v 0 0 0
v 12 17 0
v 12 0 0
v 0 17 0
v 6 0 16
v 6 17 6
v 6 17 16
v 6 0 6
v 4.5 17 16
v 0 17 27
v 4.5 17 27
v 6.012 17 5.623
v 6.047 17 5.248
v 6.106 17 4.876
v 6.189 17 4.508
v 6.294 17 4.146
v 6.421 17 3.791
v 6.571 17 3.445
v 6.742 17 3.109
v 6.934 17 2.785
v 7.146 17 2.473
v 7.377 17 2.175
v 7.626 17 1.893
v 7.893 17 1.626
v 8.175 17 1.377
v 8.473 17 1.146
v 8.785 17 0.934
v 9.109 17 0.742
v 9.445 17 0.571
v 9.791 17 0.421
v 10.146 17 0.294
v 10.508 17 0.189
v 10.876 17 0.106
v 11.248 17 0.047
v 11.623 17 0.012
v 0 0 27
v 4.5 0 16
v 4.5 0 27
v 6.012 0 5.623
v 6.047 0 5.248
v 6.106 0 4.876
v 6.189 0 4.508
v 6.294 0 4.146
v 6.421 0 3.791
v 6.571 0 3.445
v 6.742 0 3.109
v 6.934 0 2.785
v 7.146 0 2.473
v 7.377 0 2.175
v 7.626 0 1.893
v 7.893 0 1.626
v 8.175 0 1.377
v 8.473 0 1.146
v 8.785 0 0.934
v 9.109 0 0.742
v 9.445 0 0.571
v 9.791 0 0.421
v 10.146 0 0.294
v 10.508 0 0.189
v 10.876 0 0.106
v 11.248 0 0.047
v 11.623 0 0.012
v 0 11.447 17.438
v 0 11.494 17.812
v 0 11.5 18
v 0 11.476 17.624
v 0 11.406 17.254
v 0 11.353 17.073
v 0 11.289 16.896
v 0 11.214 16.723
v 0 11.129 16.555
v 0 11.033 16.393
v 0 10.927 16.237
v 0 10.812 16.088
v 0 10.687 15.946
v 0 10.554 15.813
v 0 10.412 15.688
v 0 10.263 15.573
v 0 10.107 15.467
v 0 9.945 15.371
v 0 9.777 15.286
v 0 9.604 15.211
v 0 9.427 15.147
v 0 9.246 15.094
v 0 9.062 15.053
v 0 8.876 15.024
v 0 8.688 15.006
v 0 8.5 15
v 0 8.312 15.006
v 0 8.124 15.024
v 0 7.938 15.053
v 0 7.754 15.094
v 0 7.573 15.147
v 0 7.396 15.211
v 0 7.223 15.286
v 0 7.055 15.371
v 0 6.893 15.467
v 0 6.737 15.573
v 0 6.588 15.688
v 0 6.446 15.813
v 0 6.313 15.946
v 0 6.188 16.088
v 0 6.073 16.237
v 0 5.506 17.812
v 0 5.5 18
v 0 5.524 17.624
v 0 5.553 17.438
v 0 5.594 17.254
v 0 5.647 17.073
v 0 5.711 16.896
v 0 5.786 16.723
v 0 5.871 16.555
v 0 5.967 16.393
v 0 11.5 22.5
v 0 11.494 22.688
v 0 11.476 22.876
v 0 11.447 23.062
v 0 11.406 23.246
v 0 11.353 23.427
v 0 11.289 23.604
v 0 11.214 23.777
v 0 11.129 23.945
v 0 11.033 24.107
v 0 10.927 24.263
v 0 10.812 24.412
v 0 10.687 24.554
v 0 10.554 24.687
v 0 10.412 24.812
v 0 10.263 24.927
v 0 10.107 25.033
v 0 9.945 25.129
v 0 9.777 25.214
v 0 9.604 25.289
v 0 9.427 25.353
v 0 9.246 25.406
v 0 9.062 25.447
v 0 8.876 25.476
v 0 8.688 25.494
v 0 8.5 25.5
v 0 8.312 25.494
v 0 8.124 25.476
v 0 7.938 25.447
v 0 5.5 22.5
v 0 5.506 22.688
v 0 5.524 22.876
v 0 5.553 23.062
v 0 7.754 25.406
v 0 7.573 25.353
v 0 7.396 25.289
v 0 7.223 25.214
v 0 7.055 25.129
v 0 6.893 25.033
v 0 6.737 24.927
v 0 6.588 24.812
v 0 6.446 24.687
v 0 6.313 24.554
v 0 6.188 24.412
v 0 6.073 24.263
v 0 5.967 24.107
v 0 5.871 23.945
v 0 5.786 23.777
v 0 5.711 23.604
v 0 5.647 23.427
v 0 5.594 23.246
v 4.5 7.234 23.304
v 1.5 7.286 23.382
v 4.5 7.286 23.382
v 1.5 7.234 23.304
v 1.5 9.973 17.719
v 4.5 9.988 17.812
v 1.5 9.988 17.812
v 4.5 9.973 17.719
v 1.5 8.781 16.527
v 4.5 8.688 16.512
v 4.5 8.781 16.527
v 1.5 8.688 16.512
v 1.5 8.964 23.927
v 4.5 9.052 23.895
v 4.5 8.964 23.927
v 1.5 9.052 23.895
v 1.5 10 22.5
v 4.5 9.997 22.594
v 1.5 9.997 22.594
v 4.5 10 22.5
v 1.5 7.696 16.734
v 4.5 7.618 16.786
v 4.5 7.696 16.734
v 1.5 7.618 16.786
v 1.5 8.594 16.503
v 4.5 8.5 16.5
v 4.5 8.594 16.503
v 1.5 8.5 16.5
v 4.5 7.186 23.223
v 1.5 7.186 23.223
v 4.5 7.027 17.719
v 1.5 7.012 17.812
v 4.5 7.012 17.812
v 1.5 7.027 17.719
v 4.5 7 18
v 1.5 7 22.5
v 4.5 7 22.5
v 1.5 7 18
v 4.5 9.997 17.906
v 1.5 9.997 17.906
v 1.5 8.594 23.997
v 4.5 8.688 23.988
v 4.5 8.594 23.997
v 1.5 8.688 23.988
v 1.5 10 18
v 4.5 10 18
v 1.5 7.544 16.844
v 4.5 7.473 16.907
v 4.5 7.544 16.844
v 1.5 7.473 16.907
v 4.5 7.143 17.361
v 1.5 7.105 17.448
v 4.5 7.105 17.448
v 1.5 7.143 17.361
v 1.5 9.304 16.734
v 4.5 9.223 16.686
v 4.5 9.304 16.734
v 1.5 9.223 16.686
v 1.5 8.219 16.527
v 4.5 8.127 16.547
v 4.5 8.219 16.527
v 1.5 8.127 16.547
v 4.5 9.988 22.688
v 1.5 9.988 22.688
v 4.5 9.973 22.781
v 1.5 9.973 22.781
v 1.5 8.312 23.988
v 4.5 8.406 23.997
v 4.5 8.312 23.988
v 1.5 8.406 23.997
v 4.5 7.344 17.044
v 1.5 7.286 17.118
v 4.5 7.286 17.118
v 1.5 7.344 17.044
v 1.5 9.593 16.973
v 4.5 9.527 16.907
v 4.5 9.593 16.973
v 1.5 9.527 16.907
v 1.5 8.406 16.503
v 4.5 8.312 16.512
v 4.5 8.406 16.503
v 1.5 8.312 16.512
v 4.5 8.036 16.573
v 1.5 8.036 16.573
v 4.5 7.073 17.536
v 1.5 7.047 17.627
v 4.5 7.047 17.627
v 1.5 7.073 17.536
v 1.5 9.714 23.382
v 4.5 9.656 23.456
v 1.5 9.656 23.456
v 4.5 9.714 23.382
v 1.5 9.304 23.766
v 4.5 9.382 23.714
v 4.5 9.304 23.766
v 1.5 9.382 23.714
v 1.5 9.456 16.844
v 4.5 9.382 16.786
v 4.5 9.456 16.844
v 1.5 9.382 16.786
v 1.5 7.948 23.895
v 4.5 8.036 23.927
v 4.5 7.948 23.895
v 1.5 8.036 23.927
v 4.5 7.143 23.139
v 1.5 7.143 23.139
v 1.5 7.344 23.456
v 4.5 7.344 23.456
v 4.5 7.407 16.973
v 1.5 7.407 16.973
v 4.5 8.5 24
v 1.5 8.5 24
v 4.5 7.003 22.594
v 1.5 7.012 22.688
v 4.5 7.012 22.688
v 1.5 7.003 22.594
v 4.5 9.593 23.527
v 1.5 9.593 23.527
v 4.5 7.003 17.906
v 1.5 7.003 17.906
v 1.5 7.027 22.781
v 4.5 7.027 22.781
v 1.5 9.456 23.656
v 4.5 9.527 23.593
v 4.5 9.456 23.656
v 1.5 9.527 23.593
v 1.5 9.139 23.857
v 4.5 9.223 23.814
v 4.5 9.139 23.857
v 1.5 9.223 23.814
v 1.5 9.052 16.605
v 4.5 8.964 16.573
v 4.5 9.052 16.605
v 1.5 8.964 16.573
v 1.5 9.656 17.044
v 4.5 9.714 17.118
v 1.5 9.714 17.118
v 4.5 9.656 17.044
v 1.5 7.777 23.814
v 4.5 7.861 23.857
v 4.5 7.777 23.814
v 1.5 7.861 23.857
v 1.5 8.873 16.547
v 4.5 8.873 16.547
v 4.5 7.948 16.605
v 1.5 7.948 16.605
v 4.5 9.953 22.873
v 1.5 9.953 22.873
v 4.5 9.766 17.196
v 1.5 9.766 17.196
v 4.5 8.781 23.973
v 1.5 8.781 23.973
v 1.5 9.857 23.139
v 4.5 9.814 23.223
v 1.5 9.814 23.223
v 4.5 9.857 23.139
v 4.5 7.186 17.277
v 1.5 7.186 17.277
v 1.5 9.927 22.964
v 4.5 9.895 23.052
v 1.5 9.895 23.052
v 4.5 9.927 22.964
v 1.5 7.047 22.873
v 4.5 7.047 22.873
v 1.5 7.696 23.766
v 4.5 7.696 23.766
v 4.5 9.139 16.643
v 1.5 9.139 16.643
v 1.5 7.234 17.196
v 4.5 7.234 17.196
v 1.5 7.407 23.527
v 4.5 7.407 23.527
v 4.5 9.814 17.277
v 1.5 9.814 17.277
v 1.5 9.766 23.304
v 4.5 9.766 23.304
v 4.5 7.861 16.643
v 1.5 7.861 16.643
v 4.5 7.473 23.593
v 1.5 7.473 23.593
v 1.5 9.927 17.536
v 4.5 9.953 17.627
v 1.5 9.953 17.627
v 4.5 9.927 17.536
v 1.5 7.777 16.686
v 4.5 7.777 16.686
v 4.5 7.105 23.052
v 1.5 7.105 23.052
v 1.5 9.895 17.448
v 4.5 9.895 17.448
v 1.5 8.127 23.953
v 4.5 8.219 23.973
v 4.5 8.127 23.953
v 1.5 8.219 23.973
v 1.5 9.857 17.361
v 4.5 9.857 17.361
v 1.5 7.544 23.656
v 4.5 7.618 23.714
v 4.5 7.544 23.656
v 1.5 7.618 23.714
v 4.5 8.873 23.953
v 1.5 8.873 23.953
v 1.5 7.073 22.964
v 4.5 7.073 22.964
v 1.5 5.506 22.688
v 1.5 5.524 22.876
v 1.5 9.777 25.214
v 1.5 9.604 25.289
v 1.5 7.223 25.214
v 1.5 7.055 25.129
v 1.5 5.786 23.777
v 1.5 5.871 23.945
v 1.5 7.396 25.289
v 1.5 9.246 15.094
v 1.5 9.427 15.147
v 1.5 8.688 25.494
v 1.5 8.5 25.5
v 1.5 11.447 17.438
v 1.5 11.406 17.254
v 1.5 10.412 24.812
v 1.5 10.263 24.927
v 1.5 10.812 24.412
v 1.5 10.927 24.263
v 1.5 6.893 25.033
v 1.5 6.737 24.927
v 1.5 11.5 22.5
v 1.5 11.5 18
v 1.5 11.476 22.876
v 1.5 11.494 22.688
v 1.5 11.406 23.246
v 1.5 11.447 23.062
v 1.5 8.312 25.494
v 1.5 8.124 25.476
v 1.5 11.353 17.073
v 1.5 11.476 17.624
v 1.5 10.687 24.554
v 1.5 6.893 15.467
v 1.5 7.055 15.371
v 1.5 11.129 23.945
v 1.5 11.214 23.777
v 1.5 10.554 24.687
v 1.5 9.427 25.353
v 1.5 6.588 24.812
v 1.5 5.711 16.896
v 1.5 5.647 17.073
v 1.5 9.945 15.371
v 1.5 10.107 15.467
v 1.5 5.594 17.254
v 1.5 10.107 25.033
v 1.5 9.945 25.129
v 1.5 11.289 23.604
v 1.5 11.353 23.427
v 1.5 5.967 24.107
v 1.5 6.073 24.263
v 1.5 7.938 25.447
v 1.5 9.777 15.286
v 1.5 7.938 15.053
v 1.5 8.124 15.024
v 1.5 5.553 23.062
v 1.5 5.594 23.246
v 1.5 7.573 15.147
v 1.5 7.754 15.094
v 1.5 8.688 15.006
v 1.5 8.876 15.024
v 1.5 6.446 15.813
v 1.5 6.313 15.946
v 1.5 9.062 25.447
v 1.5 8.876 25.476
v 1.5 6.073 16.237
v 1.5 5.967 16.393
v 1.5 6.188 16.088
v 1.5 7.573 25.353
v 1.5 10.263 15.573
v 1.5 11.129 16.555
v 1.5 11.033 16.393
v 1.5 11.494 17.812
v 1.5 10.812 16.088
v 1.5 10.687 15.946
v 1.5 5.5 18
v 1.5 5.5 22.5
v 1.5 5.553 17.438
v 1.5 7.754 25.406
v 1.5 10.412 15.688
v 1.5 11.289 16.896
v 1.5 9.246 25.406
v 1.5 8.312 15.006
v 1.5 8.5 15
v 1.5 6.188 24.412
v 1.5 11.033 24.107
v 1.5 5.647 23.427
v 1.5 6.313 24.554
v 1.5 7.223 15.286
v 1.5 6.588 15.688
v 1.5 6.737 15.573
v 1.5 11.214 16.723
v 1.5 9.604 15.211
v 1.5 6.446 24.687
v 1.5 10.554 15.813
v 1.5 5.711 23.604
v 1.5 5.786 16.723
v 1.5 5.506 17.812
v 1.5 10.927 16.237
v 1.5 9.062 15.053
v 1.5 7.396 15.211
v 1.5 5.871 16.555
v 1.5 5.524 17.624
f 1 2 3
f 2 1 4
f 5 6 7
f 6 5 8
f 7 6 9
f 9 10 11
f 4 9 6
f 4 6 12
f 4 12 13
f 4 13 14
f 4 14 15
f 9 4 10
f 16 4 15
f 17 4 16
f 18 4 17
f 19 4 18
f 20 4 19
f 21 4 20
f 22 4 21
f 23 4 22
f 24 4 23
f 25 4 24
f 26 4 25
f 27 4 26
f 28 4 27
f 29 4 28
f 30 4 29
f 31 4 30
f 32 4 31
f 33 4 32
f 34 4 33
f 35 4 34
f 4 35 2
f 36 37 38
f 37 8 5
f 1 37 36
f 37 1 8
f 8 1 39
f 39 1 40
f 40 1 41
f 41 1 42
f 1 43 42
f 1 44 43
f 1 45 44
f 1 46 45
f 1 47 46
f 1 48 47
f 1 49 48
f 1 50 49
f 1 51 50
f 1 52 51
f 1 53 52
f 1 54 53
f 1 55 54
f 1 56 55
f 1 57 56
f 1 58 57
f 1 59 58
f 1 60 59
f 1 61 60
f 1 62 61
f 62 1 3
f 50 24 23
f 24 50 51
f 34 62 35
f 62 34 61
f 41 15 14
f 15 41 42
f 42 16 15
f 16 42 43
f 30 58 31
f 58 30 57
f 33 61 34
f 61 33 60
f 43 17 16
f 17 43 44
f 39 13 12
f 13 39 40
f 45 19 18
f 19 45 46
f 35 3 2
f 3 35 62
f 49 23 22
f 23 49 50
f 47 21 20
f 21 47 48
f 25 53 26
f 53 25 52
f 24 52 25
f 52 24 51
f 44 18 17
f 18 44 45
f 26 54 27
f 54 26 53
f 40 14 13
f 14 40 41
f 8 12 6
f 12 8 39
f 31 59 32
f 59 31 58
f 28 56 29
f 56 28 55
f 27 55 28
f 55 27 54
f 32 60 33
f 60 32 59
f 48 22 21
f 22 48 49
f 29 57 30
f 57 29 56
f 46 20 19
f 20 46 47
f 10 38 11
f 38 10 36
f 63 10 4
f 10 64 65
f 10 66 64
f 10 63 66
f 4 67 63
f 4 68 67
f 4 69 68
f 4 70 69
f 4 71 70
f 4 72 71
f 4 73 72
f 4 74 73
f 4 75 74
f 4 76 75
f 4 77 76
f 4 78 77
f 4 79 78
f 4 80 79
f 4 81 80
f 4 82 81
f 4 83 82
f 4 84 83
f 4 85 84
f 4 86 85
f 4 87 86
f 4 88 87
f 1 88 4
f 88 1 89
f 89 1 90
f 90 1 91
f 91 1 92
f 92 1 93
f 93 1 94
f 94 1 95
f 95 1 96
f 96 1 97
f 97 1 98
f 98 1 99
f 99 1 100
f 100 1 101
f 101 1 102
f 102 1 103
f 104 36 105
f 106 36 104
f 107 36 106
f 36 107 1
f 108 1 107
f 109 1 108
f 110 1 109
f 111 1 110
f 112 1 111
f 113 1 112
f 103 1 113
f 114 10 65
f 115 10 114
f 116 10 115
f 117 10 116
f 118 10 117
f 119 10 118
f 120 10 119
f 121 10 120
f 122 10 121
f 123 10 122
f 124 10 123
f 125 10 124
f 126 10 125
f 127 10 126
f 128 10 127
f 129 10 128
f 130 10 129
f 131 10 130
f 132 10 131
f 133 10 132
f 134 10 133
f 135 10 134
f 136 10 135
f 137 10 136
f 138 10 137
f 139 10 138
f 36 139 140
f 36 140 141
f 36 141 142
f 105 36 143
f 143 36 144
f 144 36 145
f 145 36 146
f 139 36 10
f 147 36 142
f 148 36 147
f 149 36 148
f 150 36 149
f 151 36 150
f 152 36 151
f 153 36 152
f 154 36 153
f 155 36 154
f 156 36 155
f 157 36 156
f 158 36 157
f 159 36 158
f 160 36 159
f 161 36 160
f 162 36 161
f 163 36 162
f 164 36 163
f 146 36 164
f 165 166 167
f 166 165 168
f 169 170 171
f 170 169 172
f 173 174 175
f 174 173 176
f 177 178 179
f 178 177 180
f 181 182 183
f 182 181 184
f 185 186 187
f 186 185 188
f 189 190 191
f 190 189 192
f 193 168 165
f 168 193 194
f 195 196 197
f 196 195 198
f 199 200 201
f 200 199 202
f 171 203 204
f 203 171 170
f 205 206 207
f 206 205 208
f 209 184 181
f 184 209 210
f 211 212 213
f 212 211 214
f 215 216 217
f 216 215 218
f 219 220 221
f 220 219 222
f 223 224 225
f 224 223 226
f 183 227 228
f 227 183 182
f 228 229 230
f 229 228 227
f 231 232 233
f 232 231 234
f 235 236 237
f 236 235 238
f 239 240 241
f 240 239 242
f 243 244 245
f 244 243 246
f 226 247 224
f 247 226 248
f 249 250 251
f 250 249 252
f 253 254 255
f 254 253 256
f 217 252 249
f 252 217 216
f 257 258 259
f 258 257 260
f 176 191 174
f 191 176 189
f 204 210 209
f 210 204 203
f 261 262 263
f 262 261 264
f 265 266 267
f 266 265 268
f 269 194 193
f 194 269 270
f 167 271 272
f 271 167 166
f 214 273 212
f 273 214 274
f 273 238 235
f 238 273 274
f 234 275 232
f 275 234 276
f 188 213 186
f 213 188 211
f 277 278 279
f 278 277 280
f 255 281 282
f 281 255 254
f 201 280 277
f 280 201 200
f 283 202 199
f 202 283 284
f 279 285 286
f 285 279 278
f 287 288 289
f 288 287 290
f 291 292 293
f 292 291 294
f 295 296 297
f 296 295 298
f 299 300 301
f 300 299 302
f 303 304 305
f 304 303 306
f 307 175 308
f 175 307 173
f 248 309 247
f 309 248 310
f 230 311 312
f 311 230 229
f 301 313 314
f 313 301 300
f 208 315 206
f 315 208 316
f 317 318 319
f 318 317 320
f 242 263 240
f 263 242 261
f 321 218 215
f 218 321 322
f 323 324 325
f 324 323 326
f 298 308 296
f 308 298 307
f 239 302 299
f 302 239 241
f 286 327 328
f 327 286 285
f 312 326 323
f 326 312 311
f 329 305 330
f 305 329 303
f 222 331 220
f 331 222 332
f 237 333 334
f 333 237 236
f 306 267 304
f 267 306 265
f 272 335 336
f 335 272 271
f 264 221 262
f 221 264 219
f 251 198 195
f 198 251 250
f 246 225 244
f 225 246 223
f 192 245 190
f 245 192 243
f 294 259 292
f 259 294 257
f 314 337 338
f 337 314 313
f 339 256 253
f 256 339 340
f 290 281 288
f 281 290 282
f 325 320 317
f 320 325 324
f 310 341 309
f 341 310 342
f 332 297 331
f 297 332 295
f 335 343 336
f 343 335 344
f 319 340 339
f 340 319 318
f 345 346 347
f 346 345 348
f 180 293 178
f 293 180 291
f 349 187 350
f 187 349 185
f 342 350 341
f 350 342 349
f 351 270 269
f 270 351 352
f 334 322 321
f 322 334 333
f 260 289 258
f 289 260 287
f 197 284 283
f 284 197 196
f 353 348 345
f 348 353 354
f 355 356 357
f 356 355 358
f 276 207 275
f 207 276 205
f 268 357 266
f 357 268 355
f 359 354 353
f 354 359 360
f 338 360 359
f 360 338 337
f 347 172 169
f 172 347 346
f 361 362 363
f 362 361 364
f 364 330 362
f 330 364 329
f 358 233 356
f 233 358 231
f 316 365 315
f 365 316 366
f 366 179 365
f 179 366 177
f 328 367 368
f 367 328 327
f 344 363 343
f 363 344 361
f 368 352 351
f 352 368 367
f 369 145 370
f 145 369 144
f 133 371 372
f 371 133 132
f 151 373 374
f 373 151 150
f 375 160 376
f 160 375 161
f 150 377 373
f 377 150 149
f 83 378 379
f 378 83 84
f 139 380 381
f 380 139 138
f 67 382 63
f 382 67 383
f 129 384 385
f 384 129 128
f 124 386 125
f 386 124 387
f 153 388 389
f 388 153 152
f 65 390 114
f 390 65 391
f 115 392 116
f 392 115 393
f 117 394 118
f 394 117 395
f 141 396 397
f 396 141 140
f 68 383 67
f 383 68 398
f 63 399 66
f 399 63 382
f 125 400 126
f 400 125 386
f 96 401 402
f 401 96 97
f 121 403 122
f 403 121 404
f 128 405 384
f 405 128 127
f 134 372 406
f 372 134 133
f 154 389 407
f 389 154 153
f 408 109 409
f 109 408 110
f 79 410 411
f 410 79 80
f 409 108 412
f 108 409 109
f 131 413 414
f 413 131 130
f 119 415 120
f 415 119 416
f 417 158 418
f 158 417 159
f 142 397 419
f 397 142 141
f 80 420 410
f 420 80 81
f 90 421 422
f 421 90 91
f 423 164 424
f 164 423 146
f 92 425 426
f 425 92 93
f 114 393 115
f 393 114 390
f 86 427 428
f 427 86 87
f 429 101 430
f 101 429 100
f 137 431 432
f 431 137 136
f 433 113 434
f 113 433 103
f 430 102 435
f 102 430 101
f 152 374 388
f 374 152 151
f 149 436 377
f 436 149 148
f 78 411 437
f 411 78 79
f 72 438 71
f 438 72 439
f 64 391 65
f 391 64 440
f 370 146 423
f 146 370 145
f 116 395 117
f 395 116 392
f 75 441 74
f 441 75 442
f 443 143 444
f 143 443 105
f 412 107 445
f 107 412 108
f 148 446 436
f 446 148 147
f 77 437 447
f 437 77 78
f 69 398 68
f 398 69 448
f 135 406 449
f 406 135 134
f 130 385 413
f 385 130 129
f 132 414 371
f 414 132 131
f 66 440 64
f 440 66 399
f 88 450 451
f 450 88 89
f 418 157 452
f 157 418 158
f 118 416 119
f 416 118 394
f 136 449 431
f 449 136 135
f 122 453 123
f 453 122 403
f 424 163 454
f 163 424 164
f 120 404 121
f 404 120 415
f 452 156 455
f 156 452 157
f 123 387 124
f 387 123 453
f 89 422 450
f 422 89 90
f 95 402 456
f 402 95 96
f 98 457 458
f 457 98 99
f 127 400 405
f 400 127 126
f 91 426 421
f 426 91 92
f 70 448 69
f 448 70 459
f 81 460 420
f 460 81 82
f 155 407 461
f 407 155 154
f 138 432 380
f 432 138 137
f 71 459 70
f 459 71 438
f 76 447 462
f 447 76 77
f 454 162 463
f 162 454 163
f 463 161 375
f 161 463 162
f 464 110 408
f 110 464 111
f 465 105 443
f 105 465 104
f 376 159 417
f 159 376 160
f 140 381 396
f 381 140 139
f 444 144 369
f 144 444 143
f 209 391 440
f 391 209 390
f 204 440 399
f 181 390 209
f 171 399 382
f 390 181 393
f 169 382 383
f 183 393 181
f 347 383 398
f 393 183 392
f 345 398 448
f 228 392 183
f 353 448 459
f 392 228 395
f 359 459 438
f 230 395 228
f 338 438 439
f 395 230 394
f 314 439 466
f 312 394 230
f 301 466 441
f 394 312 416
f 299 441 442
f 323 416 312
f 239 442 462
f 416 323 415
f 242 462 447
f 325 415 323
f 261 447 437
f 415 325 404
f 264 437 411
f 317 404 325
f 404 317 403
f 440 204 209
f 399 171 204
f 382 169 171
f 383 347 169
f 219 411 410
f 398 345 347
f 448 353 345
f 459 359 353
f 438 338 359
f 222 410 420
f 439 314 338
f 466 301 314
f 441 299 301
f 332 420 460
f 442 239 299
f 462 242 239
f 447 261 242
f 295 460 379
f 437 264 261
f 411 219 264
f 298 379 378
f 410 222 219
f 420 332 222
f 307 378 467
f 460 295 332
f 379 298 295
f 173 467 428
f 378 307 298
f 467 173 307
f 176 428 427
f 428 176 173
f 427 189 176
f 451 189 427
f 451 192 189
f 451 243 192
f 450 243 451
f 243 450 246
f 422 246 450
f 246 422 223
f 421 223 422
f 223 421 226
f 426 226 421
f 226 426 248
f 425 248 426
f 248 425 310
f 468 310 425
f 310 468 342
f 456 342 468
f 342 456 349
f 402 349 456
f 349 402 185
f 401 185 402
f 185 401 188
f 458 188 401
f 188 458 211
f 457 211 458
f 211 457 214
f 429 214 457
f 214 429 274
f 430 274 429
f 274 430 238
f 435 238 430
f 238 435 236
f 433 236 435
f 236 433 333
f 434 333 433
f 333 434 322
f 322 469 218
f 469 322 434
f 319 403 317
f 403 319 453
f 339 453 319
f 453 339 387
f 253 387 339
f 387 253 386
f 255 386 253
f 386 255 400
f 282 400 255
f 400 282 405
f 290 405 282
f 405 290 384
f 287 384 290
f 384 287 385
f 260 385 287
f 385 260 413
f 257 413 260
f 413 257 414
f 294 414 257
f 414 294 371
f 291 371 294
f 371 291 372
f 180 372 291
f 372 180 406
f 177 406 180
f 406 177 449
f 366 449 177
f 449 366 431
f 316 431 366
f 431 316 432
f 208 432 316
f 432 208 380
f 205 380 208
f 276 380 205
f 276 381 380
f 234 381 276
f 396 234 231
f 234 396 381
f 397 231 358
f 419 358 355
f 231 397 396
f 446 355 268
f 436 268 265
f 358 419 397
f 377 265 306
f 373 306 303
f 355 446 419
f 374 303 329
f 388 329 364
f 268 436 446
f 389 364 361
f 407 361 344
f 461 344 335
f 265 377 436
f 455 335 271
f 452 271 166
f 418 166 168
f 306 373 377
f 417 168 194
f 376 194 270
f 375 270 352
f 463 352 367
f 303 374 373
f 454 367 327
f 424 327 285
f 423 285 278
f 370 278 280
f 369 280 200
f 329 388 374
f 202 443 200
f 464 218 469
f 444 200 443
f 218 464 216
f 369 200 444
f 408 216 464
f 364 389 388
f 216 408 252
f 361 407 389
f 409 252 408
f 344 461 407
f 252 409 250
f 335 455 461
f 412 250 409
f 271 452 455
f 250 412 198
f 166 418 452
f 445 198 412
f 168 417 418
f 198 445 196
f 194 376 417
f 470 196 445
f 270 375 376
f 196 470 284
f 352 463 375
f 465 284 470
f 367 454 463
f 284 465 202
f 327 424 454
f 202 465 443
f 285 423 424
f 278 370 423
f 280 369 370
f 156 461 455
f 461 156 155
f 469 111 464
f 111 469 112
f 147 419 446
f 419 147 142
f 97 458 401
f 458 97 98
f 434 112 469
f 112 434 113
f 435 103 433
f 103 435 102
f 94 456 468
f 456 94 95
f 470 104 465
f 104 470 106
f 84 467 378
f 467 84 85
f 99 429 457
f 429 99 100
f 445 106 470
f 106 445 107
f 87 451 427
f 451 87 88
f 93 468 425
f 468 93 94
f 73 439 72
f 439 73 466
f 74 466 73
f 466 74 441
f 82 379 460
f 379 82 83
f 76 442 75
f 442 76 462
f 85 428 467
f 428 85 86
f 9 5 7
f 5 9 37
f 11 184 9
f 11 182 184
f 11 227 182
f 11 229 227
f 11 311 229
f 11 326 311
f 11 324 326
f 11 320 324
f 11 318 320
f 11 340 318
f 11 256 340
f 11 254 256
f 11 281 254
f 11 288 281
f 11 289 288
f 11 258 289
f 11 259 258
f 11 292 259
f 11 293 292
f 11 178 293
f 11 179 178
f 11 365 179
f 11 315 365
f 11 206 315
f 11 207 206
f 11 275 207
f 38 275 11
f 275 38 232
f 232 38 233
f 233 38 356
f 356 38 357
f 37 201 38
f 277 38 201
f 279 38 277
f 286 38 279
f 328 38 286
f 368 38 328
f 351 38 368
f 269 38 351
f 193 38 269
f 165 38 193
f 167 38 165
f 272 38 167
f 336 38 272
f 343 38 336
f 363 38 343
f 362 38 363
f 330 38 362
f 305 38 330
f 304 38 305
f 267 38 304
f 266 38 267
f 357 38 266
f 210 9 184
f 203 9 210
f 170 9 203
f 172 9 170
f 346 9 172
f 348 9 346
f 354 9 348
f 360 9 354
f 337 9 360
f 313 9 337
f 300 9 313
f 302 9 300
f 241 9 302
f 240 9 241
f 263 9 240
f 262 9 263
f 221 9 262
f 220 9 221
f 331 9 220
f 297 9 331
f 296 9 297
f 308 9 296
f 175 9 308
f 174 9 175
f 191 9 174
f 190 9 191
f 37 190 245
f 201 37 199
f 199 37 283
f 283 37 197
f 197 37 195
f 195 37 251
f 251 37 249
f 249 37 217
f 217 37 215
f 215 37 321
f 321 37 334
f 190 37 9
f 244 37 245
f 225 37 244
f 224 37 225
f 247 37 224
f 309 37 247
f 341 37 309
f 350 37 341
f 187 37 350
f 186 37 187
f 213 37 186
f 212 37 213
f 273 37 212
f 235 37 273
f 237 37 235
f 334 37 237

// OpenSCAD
$fn = $preview ? 20 : 100;

module mounting_tab() {
    thickness = 6;
    height = 27;
    width = 17;
    
    difference() {
        union() {
            cube([thickness, width, height]);
            
            translate([thickness, 0, 0])
            difference() {
                cube([6, width, 6]);
                
                rotate([90, 0, 0])
                translate([6, 6, -8.5])
                cylinder(r = 6, h = 17, center = true);
            }
        }
        
        union() {
            rotate([0, 90, 0])
            union() {
                hull() {
                    translate([-22.5, 8.5, 0])
                    cylinder(r = 1.5, h = thickness);
                    
                    translate([-18, 8.5, 0])
                    cylinder(r = 1.5, h = thickness);
                }
                
                hull() {
                    translate([-22.5, 8.5, -1.5])
                    cylinder(r = 3, h = 3);
                    
                    
                    translate([-18, 8.5, -1.5])
                    cylinder(r = 3, h = 3);
                }
            }
            
            translate([thickness - 1.5, 0, height - 11])
            cube([1.5, width, 11]);
        }
    }
}

mounting_tab();
